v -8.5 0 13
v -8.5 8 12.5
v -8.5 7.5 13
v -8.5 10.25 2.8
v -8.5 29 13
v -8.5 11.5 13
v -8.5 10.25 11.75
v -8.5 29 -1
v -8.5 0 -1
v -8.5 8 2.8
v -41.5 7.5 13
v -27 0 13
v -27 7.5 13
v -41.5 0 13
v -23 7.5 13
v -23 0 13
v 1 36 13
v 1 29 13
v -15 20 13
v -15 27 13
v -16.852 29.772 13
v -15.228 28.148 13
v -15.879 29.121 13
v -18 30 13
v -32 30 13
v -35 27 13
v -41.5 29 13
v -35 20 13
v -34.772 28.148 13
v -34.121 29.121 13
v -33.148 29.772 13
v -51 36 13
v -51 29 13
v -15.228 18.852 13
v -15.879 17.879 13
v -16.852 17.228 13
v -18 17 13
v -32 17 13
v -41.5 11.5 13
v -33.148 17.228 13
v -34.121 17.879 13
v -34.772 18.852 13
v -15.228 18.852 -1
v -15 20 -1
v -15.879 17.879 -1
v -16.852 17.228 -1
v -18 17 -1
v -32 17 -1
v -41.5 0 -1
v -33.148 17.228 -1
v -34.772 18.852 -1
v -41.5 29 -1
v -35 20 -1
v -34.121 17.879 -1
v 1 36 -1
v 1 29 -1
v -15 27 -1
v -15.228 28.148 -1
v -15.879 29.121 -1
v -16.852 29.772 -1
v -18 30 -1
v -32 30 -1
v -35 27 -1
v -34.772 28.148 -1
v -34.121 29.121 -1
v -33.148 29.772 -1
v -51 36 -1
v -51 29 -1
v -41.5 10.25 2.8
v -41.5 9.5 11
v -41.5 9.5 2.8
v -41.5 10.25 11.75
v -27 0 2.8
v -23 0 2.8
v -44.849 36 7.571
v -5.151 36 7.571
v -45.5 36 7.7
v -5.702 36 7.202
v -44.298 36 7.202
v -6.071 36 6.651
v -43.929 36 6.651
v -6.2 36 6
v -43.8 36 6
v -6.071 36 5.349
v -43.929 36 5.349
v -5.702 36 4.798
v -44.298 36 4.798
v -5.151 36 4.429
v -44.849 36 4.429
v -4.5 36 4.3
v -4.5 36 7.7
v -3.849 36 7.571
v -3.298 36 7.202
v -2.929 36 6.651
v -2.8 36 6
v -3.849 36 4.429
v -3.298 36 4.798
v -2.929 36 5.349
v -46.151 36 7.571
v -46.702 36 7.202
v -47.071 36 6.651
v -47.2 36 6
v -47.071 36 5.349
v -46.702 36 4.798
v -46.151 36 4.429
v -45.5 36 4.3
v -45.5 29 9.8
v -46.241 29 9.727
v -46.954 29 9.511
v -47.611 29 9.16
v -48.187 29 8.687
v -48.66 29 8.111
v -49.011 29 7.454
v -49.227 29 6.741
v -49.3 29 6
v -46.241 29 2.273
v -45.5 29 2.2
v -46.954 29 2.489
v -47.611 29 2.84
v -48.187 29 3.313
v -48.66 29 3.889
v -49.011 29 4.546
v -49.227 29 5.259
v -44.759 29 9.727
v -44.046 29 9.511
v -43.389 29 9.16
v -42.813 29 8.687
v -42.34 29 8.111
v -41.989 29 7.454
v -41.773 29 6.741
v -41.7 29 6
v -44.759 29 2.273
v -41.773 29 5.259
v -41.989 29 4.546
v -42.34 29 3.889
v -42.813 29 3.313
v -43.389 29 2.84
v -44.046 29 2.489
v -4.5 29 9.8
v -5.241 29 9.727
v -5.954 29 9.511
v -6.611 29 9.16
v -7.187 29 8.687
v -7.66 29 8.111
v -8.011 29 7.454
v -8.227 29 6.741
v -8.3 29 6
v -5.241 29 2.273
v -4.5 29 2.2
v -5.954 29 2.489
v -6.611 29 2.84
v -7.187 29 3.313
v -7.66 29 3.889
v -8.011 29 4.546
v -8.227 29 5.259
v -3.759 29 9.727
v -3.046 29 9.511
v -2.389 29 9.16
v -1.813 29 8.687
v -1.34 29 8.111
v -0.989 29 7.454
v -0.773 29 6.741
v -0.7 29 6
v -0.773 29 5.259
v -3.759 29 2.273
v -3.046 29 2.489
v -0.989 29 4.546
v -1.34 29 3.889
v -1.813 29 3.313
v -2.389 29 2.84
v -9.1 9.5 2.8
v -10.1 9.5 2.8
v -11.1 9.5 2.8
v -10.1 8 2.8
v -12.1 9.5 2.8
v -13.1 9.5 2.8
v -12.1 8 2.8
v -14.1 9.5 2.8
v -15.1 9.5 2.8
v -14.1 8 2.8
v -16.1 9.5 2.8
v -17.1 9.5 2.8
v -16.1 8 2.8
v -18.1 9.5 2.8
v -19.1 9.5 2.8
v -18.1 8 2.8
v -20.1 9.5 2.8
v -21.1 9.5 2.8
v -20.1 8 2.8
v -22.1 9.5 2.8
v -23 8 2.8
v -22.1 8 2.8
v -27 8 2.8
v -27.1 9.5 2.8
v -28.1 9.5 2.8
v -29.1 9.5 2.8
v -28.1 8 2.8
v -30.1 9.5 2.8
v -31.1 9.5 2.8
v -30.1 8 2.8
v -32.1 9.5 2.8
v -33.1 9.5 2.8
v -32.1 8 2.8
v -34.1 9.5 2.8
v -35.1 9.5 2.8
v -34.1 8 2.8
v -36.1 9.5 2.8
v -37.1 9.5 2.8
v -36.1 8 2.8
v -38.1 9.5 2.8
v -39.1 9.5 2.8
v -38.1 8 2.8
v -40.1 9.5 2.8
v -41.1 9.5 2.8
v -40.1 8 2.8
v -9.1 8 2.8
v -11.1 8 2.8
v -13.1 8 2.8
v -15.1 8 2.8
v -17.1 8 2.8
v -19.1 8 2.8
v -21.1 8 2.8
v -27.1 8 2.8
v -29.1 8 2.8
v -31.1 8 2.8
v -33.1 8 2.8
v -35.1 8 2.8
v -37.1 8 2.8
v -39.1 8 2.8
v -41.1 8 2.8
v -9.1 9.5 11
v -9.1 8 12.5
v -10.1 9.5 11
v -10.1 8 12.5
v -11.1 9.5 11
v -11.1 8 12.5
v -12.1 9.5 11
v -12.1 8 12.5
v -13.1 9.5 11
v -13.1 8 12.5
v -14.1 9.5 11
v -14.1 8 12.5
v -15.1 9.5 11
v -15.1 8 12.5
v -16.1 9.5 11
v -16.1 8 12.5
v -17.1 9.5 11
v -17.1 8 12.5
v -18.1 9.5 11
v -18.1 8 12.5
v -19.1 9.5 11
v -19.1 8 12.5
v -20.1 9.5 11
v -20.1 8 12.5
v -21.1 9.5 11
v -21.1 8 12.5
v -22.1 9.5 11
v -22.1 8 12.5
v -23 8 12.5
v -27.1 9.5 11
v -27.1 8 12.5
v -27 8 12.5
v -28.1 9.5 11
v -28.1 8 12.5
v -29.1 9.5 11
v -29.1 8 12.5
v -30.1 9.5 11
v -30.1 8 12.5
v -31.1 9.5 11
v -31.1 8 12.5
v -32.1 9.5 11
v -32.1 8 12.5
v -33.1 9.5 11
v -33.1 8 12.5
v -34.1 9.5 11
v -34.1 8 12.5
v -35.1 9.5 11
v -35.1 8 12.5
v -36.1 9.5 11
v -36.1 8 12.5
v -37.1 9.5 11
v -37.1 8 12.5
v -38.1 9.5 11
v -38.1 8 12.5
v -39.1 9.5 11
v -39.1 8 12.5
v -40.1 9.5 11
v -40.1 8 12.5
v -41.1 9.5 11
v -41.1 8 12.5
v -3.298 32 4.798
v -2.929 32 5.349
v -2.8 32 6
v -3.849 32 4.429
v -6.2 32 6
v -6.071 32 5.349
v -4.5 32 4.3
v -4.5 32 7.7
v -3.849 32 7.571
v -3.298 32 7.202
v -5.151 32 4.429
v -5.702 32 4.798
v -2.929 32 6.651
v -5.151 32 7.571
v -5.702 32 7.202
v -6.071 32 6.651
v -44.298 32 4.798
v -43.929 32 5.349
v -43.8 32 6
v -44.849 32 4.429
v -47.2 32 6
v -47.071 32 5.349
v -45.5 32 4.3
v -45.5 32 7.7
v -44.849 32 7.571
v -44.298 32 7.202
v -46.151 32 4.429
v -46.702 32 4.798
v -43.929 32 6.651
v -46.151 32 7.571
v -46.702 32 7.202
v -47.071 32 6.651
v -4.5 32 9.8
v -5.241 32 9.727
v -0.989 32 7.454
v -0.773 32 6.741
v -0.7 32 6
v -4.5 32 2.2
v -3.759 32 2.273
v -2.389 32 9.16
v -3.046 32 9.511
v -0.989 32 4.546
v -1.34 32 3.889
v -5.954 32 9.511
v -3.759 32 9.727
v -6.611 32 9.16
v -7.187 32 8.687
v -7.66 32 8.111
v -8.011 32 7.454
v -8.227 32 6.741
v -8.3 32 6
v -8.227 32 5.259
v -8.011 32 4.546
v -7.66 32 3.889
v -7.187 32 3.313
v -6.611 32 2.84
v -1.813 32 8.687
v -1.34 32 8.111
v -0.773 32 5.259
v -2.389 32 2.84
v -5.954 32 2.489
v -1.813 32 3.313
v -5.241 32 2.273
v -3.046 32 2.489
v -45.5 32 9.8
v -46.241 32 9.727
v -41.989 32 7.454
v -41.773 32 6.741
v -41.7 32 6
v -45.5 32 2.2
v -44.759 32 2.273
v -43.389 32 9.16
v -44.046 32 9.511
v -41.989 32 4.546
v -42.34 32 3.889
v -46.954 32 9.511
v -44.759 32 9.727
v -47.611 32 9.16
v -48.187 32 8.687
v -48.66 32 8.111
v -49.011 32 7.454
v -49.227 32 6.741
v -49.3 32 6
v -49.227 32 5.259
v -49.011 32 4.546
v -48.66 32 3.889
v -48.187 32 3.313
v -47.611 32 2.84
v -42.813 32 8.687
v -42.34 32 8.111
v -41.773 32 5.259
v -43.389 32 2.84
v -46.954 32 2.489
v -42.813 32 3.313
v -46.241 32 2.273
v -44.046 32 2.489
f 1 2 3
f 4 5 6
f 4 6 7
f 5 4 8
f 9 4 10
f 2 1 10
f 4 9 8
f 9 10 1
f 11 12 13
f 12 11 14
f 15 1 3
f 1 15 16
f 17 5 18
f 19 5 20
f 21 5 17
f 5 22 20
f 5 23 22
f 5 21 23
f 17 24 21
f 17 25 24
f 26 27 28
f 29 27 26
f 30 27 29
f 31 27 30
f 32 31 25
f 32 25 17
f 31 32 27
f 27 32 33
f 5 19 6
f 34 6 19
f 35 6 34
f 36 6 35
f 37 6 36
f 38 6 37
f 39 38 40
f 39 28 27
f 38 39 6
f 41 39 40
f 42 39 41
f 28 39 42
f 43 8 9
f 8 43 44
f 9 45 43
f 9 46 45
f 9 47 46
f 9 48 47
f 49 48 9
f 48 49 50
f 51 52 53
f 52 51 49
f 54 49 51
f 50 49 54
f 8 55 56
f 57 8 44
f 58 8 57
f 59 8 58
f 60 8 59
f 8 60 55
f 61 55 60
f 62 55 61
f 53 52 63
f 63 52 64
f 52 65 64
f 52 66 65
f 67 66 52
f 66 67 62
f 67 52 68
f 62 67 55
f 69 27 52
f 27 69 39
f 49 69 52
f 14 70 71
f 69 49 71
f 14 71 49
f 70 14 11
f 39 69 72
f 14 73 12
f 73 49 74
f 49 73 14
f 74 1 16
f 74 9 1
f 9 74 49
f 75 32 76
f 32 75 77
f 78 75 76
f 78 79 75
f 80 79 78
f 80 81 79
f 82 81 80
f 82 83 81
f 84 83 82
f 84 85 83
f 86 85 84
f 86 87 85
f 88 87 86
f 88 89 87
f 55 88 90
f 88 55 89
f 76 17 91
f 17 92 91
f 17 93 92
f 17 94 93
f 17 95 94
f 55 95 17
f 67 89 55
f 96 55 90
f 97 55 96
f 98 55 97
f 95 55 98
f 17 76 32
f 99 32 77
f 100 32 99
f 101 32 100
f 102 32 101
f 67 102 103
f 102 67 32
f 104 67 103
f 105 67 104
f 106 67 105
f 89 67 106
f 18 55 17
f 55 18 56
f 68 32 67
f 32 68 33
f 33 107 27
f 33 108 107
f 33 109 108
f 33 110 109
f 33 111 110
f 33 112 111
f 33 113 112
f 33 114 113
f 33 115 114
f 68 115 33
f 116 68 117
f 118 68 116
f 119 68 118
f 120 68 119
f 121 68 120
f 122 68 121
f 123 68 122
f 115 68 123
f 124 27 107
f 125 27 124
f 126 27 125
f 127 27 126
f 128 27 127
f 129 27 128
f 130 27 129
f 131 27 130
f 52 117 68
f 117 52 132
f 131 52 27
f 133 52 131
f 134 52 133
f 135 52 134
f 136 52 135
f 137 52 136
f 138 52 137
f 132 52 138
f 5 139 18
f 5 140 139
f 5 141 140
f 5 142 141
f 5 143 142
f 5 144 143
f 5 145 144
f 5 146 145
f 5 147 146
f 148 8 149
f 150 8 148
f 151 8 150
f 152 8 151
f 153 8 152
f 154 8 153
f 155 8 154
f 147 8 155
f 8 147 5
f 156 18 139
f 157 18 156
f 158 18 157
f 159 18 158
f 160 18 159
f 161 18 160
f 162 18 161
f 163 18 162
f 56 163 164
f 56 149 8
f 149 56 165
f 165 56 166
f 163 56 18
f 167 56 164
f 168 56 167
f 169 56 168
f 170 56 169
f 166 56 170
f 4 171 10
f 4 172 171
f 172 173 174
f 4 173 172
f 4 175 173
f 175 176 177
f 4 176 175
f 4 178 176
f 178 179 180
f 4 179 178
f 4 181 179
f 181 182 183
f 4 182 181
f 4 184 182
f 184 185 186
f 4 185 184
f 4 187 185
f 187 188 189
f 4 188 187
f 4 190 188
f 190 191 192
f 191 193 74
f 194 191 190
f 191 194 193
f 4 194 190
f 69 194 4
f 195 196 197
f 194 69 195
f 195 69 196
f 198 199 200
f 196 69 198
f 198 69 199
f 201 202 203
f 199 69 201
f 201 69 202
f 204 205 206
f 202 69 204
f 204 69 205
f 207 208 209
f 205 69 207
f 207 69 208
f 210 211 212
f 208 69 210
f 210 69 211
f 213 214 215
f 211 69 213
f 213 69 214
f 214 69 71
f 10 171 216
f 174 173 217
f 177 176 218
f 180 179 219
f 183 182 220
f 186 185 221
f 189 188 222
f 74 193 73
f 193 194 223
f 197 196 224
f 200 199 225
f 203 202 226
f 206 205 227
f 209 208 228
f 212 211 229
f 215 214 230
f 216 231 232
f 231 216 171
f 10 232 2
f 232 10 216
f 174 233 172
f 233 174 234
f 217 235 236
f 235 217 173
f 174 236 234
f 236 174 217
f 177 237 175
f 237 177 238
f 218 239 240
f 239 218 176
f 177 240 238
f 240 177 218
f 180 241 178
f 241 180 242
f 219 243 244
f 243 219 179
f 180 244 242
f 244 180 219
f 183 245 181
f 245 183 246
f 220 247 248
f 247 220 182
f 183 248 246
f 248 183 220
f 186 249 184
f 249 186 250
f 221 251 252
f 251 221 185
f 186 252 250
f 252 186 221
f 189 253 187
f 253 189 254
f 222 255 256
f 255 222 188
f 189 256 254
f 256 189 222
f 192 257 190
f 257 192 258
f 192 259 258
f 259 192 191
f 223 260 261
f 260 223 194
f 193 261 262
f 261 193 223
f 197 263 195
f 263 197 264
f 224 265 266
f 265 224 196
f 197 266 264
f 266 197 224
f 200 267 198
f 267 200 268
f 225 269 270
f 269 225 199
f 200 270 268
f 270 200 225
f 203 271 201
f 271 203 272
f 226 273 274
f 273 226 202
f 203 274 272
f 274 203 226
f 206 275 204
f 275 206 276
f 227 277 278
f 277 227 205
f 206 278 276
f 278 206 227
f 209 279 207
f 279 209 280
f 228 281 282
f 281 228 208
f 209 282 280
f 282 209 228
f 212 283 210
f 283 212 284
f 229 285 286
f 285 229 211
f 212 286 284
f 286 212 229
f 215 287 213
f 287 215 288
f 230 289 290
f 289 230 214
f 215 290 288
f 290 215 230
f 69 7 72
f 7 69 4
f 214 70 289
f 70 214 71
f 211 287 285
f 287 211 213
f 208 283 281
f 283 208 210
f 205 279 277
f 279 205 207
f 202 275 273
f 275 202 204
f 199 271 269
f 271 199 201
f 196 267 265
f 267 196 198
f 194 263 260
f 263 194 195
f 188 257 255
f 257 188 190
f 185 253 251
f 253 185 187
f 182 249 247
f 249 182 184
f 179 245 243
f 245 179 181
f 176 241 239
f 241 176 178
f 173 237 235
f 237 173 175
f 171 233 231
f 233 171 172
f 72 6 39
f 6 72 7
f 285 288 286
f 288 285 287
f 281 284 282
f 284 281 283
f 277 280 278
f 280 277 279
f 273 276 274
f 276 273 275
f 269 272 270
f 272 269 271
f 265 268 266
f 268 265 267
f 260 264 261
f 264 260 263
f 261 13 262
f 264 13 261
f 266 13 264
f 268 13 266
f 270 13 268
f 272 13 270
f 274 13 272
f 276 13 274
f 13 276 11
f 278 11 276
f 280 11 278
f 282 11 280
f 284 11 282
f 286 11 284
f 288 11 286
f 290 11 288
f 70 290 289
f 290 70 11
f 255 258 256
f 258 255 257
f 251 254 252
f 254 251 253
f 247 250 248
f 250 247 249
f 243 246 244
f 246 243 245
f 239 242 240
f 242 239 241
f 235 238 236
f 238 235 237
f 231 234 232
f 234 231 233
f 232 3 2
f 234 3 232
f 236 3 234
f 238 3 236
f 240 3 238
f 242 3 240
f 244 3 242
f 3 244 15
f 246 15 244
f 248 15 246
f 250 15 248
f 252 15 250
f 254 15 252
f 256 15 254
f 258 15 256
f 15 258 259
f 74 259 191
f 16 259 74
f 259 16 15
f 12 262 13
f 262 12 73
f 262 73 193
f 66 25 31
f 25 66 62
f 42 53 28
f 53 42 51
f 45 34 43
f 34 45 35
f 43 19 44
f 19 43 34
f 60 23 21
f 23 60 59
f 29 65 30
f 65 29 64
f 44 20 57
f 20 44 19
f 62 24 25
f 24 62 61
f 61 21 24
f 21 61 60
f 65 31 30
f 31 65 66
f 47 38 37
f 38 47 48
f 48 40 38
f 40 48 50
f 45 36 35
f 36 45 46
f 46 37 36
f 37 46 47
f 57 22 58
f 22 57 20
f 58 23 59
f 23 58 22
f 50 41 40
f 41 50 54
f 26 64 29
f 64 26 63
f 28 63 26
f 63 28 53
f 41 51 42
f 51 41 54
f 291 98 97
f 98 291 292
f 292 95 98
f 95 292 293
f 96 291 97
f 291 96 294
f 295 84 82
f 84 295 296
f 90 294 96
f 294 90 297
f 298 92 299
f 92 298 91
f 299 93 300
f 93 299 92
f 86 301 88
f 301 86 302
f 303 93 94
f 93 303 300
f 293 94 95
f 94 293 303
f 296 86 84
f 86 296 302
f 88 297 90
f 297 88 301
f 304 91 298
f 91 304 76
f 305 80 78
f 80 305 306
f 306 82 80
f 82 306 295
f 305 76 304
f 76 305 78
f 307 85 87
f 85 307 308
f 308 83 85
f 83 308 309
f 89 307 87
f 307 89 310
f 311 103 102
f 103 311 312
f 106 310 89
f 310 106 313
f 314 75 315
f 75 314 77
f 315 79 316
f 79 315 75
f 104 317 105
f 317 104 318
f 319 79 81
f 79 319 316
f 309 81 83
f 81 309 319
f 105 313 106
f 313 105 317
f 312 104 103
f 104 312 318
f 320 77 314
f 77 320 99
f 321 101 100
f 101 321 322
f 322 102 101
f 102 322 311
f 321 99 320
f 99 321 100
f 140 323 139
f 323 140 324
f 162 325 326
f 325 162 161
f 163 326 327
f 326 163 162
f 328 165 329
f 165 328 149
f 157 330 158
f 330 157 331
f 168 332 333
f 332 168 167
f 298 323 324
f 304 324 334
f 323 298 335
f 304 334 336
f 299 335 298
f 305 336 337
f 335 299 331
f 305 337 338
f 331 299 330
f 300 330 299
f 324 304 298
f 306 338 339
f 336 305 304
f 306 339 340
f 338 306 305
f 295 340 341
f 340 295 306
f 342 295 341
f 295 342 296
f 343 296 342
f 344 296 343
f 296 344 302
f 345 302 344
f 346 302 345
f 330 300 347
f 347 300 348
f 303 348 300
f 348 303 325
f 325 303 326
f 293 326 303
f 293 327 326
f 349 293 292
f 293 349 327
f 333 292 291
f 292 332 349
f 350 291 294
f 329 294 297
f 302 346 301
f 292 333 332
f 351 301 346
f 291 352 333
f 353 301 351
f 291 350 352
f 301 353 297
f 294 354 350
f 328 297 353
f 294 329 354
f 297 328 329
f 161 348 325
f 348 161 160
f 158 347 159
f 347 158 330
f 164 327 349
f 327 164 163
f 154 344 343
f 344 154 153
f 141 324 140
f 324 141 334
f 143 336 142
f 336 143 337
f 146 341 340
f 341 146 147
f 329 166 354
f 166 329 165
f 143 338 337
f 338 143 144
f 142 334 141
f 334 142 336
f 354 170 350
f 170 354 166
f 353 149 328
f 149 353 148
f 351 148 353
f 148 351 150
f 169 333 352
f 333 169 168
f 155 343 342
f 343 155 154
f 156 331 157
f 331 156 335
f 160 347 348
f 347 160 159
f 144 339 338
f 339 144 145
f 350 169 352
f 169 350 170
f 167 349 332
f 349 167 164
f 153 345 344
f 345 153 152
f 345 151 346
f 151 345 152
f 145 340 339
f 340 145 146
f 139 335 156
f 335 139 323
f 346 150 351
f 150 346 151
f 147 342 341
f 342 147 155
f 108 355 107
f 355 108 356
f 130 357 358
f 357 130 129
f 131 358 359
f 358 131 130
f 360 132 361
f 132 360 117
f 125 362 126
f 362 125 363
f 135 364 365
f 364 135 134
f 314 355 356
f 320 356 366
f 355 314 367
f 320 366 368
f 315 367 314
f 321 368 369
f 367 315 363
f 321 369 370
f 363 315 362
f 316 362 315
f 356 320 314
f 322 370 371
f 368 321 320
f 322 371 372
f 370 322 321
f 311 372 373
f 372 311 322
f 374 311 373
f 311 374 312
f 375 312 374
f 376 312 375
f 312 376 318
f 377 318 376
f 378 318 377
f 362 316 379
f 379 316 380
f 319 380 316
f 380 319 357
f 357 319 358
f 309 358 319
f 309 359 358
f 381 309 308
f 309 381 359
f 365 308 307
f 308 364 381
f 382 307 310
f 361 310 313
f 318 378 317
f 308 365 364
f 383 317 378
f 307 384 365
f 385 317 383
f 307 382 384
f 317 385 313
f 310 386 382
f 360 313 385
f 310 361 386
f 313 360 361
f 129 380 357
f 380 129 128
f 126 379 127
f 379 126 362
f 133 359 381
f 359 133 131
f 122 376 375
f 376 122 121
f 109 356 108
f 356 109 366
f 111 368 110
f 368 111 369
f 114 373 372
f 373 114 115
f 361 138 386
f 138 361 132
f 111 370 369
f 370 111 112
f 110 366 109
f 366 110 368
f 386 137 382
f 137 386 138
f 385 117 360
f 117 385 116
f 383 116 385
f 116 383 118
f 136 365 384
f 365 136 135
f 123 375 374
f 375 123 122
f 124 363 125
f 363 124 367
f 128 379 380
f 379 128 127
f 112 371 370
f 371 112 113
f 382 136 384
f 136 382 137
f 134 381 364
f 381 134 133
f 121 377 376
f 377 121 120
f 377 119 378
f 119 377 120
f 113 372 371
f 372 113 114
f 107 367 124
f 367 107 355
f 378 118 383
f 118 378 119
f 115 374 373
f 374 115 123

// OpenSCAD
// file: ../configuration.scad
/*
	Konfiguracni soubor 3D tiskarny RebeliX X2
	
	Sledujte nas na:		  
			www.RepRap4U.cz
			www.facebook.com/RebeliX.cz
			https://twitter.com/reprap4u
			https://plus.google.com/+Reprap4uCz-3Dtiskarna-RebeliX
*/

/*================ Slic3r nastaveni ==========================*/

// Vyska vrstvy pro tisknuti dilu [mm]
layer_height = 0.3;

// Sirka vytlacovaneho materialu [mm]
extrusion_width = 0.66; //Slic3r->Print Settings->Advanced->Default extrusion width

/*==================== M6 sroub ==============================*/

// Rezerva prumeru hlavy sroubu [mm]
space = 1;

// Prumer hlavy M6 sroubu (pricte se rezerva) [mm]
M6_head_diameter = 10.6+space;
//M6_head_diameter = 12+space;

// Prumer M6 sroubu
M6_dia = 6.3;

// Vyska hlavy M6 sroubu (dulezite pro zapusteni hlavy sroubu do plastu) [mm]
M6_head_height = 3.6;
//M6_head_height = 4.5;

// Delka sroubu M6 [mm]
// M6x12
M6_lenght = 12;

// Sirka matky do profilu (pokud neni pouzita, tak 0)
//profile_nut_width = 9.5;
profile_nut_width = 0;

/*=================== Nastaveni dilu =========================*/

// Posun Z zakladny
z_base_offset = 11;

// Posun Z motoru
z_motor_offset = 0;

// Tloustka rohovych spojek
// 5 mm => sroub M6x14 s podlozkou
// 3 mm => sroub M6x12 s podlozkou
coupler_thickness = 5;

// Prumer 8mm tyce
rod_8mm_d = 8.2;

// Posun drzacku mezi x-motor a x-end
x_holder_position = 6.5;

/*======================== Motory ============================*/

// Delka motoru (ovlivni dily a delky tyci pro osy Z a Y)
//SX17-1003LQFE (doporuceno hlavne na osu Z)
//motor_length = 29.5;
//SX17-1003 (doporuceno hlavne na osu Z), SX17-0503LQEF
motor_length = 34;
//SX17-1005
//motor_length = 40;
//SX17-0905 - zde je jiz problem s velkou vyskou motoru na ose Z - musi se upravit endstop-holder
//motor_length = 48;

/*================ Remeny a remenicky ========================*/

// GT2 
belt_tooth_distance = 2;
belt_tooth_ratio = 0.5;

// T2.5
//belt_tooth_distance = 2.5;
//belt_tooth_ratio = 0.68;
// main file
// PRUSA iteration3
// y-belt-holder
// GNU GPL v3
// Josef Průša <iam@josefprusa.cz> and contributors
// http://www.reprap.org/wiki/Prusa_Mendel
// http://prusamendel.org

include <../configuration.scad>
include <inc/functions.scad>

height = 14;

module belt_holder_base(){
 translate([-33-8.5,0,-1]) cube([33,15,height]); 
 //translate([-33-8.5,11,-1]) cube([33,15,16]);
 translate([-33-8.5,11,-1]) cube([33,25,height]);
 //translate([-50,22,-1]) cube([50,4,16]);
 translate([-51,29,-1]) cube([52,7,height]); 
}

module belt_holder_beltcut(){
 echo(belt_tooth_ratio*belt_tooth_distance);
 position_tweak=-1.1;
 // Belt slit
 translate([-66,-0.5+10,height/2 - 3.2 -1]) cube([67,0.55+0.20,15]);
 // Smooth insert cutout
 translate([-66,-0.5+10,height-3]) rotate([45,0,0]) cube([67,15,15]);
 // Individual teeth
for ( i = [0 : 23] ){
  translate([0-i*belt_tooth_distance+position_tweak,-0.5+8.5,height/2 - 3.2 -1]) cube([belt_tooth_ratio*belt_tooth_distance,1.7,15]);
 }
 // Middle opening
 translate([-2-25,-1,height/2 - 3.2 - 1]) cube([4,11,15]);	
 
 translate([-33-8.5+33/2,17+13/2,height/2]) rounded_box(20,13,20,6,1,1,1,1);
}

module belt_holder_holes(){
 translate([-4.5,0.1,height/2 - 1]) rotate([-90,0,0]) cylinder(h=50, r=1.7, $fn=16);
 translate([-45.5,0.1,height/2 - 1]) rotate([-90,0,0]) cylinder(h=50, r=1.7, $fn=16);
 // Vyrez pro hlavicku M3 sroubku
 translate([-4.5,32,height/2 - 1]) rotate([90,0,0]) cylinder(h=50, r=3.8, $fn=32);
 translate([-45.5,32,height/2 - 1]) rotate([90,0,0]) cylinder(h=50, r=3.8, $fn=32);
}

// Final part
module belt_holder(){
 difference(){
  belt_holder_base();
  belt_holder_beltcut();
  belt_holder_holes();
 }
}

belt_holder();
